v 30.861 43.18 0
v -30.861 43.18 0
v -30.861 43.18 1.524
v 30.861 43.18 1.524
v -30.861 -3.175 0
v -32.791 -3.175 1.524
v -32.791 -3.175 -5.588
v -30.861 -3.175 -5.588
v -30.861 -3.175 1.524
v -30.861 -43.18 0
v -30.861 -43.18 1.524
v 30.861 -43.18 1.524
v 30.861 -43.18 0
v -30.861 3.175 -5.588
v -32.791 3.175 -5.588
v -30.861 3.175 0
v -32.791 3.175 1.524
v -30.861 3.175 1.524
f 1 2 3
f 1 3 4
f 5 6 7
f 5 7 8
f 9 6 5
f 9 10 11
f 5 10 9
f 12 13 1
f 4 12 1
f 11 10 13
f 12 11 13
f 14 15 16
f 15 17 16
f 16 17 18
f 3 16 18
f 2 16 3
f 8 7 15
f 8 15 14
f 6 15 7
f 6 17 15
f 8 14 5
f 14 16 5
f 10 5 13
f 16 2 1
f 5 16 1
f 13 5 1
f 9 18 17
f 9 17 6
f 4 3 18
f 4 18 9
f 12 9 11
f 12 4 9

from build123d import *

# Parameters (mm, degrees)
F0_W     = 61.722
F0_H     = 86.36
F1_DEPTH = 1.524
F2_W     = 6.35
F2_H     = 3.048
F3_DEPTH = 1.9304
F4_W     = 1.9304
F4_H     = 6.35
F5_DEPTH = 4.064


with BuildPart() as f1:
    # F0 (on Top) → F1 (new body)
    with BuildSketch(Plane.XY):
        Rectangle(F0_W, F0_H)
    extrude(amount=F1_DEPTH)

    # F2 (on face) → F3 (join)
    with BuildSketch(Plane(origin=(-30.861, 0, 0), x_dir=(0, -1, 0), z_dir=(-1, 0, 0))):
        Rectangle(F2_W, F2_H)
    extrude(amount=F3_DEPTH)

    # F4 (on face) → F5 (join)
    with BuildSketch(Plane(origin=(0, 0, -1.524), x_dir=(1, 0, 0), z_dir=(0, 0, -1))):
        with Locations((-31.8262, 0)):
            Rectangle(F4_W, F4_H)
    extrude(amount=F5_DEPTH)


solid = f1.part
